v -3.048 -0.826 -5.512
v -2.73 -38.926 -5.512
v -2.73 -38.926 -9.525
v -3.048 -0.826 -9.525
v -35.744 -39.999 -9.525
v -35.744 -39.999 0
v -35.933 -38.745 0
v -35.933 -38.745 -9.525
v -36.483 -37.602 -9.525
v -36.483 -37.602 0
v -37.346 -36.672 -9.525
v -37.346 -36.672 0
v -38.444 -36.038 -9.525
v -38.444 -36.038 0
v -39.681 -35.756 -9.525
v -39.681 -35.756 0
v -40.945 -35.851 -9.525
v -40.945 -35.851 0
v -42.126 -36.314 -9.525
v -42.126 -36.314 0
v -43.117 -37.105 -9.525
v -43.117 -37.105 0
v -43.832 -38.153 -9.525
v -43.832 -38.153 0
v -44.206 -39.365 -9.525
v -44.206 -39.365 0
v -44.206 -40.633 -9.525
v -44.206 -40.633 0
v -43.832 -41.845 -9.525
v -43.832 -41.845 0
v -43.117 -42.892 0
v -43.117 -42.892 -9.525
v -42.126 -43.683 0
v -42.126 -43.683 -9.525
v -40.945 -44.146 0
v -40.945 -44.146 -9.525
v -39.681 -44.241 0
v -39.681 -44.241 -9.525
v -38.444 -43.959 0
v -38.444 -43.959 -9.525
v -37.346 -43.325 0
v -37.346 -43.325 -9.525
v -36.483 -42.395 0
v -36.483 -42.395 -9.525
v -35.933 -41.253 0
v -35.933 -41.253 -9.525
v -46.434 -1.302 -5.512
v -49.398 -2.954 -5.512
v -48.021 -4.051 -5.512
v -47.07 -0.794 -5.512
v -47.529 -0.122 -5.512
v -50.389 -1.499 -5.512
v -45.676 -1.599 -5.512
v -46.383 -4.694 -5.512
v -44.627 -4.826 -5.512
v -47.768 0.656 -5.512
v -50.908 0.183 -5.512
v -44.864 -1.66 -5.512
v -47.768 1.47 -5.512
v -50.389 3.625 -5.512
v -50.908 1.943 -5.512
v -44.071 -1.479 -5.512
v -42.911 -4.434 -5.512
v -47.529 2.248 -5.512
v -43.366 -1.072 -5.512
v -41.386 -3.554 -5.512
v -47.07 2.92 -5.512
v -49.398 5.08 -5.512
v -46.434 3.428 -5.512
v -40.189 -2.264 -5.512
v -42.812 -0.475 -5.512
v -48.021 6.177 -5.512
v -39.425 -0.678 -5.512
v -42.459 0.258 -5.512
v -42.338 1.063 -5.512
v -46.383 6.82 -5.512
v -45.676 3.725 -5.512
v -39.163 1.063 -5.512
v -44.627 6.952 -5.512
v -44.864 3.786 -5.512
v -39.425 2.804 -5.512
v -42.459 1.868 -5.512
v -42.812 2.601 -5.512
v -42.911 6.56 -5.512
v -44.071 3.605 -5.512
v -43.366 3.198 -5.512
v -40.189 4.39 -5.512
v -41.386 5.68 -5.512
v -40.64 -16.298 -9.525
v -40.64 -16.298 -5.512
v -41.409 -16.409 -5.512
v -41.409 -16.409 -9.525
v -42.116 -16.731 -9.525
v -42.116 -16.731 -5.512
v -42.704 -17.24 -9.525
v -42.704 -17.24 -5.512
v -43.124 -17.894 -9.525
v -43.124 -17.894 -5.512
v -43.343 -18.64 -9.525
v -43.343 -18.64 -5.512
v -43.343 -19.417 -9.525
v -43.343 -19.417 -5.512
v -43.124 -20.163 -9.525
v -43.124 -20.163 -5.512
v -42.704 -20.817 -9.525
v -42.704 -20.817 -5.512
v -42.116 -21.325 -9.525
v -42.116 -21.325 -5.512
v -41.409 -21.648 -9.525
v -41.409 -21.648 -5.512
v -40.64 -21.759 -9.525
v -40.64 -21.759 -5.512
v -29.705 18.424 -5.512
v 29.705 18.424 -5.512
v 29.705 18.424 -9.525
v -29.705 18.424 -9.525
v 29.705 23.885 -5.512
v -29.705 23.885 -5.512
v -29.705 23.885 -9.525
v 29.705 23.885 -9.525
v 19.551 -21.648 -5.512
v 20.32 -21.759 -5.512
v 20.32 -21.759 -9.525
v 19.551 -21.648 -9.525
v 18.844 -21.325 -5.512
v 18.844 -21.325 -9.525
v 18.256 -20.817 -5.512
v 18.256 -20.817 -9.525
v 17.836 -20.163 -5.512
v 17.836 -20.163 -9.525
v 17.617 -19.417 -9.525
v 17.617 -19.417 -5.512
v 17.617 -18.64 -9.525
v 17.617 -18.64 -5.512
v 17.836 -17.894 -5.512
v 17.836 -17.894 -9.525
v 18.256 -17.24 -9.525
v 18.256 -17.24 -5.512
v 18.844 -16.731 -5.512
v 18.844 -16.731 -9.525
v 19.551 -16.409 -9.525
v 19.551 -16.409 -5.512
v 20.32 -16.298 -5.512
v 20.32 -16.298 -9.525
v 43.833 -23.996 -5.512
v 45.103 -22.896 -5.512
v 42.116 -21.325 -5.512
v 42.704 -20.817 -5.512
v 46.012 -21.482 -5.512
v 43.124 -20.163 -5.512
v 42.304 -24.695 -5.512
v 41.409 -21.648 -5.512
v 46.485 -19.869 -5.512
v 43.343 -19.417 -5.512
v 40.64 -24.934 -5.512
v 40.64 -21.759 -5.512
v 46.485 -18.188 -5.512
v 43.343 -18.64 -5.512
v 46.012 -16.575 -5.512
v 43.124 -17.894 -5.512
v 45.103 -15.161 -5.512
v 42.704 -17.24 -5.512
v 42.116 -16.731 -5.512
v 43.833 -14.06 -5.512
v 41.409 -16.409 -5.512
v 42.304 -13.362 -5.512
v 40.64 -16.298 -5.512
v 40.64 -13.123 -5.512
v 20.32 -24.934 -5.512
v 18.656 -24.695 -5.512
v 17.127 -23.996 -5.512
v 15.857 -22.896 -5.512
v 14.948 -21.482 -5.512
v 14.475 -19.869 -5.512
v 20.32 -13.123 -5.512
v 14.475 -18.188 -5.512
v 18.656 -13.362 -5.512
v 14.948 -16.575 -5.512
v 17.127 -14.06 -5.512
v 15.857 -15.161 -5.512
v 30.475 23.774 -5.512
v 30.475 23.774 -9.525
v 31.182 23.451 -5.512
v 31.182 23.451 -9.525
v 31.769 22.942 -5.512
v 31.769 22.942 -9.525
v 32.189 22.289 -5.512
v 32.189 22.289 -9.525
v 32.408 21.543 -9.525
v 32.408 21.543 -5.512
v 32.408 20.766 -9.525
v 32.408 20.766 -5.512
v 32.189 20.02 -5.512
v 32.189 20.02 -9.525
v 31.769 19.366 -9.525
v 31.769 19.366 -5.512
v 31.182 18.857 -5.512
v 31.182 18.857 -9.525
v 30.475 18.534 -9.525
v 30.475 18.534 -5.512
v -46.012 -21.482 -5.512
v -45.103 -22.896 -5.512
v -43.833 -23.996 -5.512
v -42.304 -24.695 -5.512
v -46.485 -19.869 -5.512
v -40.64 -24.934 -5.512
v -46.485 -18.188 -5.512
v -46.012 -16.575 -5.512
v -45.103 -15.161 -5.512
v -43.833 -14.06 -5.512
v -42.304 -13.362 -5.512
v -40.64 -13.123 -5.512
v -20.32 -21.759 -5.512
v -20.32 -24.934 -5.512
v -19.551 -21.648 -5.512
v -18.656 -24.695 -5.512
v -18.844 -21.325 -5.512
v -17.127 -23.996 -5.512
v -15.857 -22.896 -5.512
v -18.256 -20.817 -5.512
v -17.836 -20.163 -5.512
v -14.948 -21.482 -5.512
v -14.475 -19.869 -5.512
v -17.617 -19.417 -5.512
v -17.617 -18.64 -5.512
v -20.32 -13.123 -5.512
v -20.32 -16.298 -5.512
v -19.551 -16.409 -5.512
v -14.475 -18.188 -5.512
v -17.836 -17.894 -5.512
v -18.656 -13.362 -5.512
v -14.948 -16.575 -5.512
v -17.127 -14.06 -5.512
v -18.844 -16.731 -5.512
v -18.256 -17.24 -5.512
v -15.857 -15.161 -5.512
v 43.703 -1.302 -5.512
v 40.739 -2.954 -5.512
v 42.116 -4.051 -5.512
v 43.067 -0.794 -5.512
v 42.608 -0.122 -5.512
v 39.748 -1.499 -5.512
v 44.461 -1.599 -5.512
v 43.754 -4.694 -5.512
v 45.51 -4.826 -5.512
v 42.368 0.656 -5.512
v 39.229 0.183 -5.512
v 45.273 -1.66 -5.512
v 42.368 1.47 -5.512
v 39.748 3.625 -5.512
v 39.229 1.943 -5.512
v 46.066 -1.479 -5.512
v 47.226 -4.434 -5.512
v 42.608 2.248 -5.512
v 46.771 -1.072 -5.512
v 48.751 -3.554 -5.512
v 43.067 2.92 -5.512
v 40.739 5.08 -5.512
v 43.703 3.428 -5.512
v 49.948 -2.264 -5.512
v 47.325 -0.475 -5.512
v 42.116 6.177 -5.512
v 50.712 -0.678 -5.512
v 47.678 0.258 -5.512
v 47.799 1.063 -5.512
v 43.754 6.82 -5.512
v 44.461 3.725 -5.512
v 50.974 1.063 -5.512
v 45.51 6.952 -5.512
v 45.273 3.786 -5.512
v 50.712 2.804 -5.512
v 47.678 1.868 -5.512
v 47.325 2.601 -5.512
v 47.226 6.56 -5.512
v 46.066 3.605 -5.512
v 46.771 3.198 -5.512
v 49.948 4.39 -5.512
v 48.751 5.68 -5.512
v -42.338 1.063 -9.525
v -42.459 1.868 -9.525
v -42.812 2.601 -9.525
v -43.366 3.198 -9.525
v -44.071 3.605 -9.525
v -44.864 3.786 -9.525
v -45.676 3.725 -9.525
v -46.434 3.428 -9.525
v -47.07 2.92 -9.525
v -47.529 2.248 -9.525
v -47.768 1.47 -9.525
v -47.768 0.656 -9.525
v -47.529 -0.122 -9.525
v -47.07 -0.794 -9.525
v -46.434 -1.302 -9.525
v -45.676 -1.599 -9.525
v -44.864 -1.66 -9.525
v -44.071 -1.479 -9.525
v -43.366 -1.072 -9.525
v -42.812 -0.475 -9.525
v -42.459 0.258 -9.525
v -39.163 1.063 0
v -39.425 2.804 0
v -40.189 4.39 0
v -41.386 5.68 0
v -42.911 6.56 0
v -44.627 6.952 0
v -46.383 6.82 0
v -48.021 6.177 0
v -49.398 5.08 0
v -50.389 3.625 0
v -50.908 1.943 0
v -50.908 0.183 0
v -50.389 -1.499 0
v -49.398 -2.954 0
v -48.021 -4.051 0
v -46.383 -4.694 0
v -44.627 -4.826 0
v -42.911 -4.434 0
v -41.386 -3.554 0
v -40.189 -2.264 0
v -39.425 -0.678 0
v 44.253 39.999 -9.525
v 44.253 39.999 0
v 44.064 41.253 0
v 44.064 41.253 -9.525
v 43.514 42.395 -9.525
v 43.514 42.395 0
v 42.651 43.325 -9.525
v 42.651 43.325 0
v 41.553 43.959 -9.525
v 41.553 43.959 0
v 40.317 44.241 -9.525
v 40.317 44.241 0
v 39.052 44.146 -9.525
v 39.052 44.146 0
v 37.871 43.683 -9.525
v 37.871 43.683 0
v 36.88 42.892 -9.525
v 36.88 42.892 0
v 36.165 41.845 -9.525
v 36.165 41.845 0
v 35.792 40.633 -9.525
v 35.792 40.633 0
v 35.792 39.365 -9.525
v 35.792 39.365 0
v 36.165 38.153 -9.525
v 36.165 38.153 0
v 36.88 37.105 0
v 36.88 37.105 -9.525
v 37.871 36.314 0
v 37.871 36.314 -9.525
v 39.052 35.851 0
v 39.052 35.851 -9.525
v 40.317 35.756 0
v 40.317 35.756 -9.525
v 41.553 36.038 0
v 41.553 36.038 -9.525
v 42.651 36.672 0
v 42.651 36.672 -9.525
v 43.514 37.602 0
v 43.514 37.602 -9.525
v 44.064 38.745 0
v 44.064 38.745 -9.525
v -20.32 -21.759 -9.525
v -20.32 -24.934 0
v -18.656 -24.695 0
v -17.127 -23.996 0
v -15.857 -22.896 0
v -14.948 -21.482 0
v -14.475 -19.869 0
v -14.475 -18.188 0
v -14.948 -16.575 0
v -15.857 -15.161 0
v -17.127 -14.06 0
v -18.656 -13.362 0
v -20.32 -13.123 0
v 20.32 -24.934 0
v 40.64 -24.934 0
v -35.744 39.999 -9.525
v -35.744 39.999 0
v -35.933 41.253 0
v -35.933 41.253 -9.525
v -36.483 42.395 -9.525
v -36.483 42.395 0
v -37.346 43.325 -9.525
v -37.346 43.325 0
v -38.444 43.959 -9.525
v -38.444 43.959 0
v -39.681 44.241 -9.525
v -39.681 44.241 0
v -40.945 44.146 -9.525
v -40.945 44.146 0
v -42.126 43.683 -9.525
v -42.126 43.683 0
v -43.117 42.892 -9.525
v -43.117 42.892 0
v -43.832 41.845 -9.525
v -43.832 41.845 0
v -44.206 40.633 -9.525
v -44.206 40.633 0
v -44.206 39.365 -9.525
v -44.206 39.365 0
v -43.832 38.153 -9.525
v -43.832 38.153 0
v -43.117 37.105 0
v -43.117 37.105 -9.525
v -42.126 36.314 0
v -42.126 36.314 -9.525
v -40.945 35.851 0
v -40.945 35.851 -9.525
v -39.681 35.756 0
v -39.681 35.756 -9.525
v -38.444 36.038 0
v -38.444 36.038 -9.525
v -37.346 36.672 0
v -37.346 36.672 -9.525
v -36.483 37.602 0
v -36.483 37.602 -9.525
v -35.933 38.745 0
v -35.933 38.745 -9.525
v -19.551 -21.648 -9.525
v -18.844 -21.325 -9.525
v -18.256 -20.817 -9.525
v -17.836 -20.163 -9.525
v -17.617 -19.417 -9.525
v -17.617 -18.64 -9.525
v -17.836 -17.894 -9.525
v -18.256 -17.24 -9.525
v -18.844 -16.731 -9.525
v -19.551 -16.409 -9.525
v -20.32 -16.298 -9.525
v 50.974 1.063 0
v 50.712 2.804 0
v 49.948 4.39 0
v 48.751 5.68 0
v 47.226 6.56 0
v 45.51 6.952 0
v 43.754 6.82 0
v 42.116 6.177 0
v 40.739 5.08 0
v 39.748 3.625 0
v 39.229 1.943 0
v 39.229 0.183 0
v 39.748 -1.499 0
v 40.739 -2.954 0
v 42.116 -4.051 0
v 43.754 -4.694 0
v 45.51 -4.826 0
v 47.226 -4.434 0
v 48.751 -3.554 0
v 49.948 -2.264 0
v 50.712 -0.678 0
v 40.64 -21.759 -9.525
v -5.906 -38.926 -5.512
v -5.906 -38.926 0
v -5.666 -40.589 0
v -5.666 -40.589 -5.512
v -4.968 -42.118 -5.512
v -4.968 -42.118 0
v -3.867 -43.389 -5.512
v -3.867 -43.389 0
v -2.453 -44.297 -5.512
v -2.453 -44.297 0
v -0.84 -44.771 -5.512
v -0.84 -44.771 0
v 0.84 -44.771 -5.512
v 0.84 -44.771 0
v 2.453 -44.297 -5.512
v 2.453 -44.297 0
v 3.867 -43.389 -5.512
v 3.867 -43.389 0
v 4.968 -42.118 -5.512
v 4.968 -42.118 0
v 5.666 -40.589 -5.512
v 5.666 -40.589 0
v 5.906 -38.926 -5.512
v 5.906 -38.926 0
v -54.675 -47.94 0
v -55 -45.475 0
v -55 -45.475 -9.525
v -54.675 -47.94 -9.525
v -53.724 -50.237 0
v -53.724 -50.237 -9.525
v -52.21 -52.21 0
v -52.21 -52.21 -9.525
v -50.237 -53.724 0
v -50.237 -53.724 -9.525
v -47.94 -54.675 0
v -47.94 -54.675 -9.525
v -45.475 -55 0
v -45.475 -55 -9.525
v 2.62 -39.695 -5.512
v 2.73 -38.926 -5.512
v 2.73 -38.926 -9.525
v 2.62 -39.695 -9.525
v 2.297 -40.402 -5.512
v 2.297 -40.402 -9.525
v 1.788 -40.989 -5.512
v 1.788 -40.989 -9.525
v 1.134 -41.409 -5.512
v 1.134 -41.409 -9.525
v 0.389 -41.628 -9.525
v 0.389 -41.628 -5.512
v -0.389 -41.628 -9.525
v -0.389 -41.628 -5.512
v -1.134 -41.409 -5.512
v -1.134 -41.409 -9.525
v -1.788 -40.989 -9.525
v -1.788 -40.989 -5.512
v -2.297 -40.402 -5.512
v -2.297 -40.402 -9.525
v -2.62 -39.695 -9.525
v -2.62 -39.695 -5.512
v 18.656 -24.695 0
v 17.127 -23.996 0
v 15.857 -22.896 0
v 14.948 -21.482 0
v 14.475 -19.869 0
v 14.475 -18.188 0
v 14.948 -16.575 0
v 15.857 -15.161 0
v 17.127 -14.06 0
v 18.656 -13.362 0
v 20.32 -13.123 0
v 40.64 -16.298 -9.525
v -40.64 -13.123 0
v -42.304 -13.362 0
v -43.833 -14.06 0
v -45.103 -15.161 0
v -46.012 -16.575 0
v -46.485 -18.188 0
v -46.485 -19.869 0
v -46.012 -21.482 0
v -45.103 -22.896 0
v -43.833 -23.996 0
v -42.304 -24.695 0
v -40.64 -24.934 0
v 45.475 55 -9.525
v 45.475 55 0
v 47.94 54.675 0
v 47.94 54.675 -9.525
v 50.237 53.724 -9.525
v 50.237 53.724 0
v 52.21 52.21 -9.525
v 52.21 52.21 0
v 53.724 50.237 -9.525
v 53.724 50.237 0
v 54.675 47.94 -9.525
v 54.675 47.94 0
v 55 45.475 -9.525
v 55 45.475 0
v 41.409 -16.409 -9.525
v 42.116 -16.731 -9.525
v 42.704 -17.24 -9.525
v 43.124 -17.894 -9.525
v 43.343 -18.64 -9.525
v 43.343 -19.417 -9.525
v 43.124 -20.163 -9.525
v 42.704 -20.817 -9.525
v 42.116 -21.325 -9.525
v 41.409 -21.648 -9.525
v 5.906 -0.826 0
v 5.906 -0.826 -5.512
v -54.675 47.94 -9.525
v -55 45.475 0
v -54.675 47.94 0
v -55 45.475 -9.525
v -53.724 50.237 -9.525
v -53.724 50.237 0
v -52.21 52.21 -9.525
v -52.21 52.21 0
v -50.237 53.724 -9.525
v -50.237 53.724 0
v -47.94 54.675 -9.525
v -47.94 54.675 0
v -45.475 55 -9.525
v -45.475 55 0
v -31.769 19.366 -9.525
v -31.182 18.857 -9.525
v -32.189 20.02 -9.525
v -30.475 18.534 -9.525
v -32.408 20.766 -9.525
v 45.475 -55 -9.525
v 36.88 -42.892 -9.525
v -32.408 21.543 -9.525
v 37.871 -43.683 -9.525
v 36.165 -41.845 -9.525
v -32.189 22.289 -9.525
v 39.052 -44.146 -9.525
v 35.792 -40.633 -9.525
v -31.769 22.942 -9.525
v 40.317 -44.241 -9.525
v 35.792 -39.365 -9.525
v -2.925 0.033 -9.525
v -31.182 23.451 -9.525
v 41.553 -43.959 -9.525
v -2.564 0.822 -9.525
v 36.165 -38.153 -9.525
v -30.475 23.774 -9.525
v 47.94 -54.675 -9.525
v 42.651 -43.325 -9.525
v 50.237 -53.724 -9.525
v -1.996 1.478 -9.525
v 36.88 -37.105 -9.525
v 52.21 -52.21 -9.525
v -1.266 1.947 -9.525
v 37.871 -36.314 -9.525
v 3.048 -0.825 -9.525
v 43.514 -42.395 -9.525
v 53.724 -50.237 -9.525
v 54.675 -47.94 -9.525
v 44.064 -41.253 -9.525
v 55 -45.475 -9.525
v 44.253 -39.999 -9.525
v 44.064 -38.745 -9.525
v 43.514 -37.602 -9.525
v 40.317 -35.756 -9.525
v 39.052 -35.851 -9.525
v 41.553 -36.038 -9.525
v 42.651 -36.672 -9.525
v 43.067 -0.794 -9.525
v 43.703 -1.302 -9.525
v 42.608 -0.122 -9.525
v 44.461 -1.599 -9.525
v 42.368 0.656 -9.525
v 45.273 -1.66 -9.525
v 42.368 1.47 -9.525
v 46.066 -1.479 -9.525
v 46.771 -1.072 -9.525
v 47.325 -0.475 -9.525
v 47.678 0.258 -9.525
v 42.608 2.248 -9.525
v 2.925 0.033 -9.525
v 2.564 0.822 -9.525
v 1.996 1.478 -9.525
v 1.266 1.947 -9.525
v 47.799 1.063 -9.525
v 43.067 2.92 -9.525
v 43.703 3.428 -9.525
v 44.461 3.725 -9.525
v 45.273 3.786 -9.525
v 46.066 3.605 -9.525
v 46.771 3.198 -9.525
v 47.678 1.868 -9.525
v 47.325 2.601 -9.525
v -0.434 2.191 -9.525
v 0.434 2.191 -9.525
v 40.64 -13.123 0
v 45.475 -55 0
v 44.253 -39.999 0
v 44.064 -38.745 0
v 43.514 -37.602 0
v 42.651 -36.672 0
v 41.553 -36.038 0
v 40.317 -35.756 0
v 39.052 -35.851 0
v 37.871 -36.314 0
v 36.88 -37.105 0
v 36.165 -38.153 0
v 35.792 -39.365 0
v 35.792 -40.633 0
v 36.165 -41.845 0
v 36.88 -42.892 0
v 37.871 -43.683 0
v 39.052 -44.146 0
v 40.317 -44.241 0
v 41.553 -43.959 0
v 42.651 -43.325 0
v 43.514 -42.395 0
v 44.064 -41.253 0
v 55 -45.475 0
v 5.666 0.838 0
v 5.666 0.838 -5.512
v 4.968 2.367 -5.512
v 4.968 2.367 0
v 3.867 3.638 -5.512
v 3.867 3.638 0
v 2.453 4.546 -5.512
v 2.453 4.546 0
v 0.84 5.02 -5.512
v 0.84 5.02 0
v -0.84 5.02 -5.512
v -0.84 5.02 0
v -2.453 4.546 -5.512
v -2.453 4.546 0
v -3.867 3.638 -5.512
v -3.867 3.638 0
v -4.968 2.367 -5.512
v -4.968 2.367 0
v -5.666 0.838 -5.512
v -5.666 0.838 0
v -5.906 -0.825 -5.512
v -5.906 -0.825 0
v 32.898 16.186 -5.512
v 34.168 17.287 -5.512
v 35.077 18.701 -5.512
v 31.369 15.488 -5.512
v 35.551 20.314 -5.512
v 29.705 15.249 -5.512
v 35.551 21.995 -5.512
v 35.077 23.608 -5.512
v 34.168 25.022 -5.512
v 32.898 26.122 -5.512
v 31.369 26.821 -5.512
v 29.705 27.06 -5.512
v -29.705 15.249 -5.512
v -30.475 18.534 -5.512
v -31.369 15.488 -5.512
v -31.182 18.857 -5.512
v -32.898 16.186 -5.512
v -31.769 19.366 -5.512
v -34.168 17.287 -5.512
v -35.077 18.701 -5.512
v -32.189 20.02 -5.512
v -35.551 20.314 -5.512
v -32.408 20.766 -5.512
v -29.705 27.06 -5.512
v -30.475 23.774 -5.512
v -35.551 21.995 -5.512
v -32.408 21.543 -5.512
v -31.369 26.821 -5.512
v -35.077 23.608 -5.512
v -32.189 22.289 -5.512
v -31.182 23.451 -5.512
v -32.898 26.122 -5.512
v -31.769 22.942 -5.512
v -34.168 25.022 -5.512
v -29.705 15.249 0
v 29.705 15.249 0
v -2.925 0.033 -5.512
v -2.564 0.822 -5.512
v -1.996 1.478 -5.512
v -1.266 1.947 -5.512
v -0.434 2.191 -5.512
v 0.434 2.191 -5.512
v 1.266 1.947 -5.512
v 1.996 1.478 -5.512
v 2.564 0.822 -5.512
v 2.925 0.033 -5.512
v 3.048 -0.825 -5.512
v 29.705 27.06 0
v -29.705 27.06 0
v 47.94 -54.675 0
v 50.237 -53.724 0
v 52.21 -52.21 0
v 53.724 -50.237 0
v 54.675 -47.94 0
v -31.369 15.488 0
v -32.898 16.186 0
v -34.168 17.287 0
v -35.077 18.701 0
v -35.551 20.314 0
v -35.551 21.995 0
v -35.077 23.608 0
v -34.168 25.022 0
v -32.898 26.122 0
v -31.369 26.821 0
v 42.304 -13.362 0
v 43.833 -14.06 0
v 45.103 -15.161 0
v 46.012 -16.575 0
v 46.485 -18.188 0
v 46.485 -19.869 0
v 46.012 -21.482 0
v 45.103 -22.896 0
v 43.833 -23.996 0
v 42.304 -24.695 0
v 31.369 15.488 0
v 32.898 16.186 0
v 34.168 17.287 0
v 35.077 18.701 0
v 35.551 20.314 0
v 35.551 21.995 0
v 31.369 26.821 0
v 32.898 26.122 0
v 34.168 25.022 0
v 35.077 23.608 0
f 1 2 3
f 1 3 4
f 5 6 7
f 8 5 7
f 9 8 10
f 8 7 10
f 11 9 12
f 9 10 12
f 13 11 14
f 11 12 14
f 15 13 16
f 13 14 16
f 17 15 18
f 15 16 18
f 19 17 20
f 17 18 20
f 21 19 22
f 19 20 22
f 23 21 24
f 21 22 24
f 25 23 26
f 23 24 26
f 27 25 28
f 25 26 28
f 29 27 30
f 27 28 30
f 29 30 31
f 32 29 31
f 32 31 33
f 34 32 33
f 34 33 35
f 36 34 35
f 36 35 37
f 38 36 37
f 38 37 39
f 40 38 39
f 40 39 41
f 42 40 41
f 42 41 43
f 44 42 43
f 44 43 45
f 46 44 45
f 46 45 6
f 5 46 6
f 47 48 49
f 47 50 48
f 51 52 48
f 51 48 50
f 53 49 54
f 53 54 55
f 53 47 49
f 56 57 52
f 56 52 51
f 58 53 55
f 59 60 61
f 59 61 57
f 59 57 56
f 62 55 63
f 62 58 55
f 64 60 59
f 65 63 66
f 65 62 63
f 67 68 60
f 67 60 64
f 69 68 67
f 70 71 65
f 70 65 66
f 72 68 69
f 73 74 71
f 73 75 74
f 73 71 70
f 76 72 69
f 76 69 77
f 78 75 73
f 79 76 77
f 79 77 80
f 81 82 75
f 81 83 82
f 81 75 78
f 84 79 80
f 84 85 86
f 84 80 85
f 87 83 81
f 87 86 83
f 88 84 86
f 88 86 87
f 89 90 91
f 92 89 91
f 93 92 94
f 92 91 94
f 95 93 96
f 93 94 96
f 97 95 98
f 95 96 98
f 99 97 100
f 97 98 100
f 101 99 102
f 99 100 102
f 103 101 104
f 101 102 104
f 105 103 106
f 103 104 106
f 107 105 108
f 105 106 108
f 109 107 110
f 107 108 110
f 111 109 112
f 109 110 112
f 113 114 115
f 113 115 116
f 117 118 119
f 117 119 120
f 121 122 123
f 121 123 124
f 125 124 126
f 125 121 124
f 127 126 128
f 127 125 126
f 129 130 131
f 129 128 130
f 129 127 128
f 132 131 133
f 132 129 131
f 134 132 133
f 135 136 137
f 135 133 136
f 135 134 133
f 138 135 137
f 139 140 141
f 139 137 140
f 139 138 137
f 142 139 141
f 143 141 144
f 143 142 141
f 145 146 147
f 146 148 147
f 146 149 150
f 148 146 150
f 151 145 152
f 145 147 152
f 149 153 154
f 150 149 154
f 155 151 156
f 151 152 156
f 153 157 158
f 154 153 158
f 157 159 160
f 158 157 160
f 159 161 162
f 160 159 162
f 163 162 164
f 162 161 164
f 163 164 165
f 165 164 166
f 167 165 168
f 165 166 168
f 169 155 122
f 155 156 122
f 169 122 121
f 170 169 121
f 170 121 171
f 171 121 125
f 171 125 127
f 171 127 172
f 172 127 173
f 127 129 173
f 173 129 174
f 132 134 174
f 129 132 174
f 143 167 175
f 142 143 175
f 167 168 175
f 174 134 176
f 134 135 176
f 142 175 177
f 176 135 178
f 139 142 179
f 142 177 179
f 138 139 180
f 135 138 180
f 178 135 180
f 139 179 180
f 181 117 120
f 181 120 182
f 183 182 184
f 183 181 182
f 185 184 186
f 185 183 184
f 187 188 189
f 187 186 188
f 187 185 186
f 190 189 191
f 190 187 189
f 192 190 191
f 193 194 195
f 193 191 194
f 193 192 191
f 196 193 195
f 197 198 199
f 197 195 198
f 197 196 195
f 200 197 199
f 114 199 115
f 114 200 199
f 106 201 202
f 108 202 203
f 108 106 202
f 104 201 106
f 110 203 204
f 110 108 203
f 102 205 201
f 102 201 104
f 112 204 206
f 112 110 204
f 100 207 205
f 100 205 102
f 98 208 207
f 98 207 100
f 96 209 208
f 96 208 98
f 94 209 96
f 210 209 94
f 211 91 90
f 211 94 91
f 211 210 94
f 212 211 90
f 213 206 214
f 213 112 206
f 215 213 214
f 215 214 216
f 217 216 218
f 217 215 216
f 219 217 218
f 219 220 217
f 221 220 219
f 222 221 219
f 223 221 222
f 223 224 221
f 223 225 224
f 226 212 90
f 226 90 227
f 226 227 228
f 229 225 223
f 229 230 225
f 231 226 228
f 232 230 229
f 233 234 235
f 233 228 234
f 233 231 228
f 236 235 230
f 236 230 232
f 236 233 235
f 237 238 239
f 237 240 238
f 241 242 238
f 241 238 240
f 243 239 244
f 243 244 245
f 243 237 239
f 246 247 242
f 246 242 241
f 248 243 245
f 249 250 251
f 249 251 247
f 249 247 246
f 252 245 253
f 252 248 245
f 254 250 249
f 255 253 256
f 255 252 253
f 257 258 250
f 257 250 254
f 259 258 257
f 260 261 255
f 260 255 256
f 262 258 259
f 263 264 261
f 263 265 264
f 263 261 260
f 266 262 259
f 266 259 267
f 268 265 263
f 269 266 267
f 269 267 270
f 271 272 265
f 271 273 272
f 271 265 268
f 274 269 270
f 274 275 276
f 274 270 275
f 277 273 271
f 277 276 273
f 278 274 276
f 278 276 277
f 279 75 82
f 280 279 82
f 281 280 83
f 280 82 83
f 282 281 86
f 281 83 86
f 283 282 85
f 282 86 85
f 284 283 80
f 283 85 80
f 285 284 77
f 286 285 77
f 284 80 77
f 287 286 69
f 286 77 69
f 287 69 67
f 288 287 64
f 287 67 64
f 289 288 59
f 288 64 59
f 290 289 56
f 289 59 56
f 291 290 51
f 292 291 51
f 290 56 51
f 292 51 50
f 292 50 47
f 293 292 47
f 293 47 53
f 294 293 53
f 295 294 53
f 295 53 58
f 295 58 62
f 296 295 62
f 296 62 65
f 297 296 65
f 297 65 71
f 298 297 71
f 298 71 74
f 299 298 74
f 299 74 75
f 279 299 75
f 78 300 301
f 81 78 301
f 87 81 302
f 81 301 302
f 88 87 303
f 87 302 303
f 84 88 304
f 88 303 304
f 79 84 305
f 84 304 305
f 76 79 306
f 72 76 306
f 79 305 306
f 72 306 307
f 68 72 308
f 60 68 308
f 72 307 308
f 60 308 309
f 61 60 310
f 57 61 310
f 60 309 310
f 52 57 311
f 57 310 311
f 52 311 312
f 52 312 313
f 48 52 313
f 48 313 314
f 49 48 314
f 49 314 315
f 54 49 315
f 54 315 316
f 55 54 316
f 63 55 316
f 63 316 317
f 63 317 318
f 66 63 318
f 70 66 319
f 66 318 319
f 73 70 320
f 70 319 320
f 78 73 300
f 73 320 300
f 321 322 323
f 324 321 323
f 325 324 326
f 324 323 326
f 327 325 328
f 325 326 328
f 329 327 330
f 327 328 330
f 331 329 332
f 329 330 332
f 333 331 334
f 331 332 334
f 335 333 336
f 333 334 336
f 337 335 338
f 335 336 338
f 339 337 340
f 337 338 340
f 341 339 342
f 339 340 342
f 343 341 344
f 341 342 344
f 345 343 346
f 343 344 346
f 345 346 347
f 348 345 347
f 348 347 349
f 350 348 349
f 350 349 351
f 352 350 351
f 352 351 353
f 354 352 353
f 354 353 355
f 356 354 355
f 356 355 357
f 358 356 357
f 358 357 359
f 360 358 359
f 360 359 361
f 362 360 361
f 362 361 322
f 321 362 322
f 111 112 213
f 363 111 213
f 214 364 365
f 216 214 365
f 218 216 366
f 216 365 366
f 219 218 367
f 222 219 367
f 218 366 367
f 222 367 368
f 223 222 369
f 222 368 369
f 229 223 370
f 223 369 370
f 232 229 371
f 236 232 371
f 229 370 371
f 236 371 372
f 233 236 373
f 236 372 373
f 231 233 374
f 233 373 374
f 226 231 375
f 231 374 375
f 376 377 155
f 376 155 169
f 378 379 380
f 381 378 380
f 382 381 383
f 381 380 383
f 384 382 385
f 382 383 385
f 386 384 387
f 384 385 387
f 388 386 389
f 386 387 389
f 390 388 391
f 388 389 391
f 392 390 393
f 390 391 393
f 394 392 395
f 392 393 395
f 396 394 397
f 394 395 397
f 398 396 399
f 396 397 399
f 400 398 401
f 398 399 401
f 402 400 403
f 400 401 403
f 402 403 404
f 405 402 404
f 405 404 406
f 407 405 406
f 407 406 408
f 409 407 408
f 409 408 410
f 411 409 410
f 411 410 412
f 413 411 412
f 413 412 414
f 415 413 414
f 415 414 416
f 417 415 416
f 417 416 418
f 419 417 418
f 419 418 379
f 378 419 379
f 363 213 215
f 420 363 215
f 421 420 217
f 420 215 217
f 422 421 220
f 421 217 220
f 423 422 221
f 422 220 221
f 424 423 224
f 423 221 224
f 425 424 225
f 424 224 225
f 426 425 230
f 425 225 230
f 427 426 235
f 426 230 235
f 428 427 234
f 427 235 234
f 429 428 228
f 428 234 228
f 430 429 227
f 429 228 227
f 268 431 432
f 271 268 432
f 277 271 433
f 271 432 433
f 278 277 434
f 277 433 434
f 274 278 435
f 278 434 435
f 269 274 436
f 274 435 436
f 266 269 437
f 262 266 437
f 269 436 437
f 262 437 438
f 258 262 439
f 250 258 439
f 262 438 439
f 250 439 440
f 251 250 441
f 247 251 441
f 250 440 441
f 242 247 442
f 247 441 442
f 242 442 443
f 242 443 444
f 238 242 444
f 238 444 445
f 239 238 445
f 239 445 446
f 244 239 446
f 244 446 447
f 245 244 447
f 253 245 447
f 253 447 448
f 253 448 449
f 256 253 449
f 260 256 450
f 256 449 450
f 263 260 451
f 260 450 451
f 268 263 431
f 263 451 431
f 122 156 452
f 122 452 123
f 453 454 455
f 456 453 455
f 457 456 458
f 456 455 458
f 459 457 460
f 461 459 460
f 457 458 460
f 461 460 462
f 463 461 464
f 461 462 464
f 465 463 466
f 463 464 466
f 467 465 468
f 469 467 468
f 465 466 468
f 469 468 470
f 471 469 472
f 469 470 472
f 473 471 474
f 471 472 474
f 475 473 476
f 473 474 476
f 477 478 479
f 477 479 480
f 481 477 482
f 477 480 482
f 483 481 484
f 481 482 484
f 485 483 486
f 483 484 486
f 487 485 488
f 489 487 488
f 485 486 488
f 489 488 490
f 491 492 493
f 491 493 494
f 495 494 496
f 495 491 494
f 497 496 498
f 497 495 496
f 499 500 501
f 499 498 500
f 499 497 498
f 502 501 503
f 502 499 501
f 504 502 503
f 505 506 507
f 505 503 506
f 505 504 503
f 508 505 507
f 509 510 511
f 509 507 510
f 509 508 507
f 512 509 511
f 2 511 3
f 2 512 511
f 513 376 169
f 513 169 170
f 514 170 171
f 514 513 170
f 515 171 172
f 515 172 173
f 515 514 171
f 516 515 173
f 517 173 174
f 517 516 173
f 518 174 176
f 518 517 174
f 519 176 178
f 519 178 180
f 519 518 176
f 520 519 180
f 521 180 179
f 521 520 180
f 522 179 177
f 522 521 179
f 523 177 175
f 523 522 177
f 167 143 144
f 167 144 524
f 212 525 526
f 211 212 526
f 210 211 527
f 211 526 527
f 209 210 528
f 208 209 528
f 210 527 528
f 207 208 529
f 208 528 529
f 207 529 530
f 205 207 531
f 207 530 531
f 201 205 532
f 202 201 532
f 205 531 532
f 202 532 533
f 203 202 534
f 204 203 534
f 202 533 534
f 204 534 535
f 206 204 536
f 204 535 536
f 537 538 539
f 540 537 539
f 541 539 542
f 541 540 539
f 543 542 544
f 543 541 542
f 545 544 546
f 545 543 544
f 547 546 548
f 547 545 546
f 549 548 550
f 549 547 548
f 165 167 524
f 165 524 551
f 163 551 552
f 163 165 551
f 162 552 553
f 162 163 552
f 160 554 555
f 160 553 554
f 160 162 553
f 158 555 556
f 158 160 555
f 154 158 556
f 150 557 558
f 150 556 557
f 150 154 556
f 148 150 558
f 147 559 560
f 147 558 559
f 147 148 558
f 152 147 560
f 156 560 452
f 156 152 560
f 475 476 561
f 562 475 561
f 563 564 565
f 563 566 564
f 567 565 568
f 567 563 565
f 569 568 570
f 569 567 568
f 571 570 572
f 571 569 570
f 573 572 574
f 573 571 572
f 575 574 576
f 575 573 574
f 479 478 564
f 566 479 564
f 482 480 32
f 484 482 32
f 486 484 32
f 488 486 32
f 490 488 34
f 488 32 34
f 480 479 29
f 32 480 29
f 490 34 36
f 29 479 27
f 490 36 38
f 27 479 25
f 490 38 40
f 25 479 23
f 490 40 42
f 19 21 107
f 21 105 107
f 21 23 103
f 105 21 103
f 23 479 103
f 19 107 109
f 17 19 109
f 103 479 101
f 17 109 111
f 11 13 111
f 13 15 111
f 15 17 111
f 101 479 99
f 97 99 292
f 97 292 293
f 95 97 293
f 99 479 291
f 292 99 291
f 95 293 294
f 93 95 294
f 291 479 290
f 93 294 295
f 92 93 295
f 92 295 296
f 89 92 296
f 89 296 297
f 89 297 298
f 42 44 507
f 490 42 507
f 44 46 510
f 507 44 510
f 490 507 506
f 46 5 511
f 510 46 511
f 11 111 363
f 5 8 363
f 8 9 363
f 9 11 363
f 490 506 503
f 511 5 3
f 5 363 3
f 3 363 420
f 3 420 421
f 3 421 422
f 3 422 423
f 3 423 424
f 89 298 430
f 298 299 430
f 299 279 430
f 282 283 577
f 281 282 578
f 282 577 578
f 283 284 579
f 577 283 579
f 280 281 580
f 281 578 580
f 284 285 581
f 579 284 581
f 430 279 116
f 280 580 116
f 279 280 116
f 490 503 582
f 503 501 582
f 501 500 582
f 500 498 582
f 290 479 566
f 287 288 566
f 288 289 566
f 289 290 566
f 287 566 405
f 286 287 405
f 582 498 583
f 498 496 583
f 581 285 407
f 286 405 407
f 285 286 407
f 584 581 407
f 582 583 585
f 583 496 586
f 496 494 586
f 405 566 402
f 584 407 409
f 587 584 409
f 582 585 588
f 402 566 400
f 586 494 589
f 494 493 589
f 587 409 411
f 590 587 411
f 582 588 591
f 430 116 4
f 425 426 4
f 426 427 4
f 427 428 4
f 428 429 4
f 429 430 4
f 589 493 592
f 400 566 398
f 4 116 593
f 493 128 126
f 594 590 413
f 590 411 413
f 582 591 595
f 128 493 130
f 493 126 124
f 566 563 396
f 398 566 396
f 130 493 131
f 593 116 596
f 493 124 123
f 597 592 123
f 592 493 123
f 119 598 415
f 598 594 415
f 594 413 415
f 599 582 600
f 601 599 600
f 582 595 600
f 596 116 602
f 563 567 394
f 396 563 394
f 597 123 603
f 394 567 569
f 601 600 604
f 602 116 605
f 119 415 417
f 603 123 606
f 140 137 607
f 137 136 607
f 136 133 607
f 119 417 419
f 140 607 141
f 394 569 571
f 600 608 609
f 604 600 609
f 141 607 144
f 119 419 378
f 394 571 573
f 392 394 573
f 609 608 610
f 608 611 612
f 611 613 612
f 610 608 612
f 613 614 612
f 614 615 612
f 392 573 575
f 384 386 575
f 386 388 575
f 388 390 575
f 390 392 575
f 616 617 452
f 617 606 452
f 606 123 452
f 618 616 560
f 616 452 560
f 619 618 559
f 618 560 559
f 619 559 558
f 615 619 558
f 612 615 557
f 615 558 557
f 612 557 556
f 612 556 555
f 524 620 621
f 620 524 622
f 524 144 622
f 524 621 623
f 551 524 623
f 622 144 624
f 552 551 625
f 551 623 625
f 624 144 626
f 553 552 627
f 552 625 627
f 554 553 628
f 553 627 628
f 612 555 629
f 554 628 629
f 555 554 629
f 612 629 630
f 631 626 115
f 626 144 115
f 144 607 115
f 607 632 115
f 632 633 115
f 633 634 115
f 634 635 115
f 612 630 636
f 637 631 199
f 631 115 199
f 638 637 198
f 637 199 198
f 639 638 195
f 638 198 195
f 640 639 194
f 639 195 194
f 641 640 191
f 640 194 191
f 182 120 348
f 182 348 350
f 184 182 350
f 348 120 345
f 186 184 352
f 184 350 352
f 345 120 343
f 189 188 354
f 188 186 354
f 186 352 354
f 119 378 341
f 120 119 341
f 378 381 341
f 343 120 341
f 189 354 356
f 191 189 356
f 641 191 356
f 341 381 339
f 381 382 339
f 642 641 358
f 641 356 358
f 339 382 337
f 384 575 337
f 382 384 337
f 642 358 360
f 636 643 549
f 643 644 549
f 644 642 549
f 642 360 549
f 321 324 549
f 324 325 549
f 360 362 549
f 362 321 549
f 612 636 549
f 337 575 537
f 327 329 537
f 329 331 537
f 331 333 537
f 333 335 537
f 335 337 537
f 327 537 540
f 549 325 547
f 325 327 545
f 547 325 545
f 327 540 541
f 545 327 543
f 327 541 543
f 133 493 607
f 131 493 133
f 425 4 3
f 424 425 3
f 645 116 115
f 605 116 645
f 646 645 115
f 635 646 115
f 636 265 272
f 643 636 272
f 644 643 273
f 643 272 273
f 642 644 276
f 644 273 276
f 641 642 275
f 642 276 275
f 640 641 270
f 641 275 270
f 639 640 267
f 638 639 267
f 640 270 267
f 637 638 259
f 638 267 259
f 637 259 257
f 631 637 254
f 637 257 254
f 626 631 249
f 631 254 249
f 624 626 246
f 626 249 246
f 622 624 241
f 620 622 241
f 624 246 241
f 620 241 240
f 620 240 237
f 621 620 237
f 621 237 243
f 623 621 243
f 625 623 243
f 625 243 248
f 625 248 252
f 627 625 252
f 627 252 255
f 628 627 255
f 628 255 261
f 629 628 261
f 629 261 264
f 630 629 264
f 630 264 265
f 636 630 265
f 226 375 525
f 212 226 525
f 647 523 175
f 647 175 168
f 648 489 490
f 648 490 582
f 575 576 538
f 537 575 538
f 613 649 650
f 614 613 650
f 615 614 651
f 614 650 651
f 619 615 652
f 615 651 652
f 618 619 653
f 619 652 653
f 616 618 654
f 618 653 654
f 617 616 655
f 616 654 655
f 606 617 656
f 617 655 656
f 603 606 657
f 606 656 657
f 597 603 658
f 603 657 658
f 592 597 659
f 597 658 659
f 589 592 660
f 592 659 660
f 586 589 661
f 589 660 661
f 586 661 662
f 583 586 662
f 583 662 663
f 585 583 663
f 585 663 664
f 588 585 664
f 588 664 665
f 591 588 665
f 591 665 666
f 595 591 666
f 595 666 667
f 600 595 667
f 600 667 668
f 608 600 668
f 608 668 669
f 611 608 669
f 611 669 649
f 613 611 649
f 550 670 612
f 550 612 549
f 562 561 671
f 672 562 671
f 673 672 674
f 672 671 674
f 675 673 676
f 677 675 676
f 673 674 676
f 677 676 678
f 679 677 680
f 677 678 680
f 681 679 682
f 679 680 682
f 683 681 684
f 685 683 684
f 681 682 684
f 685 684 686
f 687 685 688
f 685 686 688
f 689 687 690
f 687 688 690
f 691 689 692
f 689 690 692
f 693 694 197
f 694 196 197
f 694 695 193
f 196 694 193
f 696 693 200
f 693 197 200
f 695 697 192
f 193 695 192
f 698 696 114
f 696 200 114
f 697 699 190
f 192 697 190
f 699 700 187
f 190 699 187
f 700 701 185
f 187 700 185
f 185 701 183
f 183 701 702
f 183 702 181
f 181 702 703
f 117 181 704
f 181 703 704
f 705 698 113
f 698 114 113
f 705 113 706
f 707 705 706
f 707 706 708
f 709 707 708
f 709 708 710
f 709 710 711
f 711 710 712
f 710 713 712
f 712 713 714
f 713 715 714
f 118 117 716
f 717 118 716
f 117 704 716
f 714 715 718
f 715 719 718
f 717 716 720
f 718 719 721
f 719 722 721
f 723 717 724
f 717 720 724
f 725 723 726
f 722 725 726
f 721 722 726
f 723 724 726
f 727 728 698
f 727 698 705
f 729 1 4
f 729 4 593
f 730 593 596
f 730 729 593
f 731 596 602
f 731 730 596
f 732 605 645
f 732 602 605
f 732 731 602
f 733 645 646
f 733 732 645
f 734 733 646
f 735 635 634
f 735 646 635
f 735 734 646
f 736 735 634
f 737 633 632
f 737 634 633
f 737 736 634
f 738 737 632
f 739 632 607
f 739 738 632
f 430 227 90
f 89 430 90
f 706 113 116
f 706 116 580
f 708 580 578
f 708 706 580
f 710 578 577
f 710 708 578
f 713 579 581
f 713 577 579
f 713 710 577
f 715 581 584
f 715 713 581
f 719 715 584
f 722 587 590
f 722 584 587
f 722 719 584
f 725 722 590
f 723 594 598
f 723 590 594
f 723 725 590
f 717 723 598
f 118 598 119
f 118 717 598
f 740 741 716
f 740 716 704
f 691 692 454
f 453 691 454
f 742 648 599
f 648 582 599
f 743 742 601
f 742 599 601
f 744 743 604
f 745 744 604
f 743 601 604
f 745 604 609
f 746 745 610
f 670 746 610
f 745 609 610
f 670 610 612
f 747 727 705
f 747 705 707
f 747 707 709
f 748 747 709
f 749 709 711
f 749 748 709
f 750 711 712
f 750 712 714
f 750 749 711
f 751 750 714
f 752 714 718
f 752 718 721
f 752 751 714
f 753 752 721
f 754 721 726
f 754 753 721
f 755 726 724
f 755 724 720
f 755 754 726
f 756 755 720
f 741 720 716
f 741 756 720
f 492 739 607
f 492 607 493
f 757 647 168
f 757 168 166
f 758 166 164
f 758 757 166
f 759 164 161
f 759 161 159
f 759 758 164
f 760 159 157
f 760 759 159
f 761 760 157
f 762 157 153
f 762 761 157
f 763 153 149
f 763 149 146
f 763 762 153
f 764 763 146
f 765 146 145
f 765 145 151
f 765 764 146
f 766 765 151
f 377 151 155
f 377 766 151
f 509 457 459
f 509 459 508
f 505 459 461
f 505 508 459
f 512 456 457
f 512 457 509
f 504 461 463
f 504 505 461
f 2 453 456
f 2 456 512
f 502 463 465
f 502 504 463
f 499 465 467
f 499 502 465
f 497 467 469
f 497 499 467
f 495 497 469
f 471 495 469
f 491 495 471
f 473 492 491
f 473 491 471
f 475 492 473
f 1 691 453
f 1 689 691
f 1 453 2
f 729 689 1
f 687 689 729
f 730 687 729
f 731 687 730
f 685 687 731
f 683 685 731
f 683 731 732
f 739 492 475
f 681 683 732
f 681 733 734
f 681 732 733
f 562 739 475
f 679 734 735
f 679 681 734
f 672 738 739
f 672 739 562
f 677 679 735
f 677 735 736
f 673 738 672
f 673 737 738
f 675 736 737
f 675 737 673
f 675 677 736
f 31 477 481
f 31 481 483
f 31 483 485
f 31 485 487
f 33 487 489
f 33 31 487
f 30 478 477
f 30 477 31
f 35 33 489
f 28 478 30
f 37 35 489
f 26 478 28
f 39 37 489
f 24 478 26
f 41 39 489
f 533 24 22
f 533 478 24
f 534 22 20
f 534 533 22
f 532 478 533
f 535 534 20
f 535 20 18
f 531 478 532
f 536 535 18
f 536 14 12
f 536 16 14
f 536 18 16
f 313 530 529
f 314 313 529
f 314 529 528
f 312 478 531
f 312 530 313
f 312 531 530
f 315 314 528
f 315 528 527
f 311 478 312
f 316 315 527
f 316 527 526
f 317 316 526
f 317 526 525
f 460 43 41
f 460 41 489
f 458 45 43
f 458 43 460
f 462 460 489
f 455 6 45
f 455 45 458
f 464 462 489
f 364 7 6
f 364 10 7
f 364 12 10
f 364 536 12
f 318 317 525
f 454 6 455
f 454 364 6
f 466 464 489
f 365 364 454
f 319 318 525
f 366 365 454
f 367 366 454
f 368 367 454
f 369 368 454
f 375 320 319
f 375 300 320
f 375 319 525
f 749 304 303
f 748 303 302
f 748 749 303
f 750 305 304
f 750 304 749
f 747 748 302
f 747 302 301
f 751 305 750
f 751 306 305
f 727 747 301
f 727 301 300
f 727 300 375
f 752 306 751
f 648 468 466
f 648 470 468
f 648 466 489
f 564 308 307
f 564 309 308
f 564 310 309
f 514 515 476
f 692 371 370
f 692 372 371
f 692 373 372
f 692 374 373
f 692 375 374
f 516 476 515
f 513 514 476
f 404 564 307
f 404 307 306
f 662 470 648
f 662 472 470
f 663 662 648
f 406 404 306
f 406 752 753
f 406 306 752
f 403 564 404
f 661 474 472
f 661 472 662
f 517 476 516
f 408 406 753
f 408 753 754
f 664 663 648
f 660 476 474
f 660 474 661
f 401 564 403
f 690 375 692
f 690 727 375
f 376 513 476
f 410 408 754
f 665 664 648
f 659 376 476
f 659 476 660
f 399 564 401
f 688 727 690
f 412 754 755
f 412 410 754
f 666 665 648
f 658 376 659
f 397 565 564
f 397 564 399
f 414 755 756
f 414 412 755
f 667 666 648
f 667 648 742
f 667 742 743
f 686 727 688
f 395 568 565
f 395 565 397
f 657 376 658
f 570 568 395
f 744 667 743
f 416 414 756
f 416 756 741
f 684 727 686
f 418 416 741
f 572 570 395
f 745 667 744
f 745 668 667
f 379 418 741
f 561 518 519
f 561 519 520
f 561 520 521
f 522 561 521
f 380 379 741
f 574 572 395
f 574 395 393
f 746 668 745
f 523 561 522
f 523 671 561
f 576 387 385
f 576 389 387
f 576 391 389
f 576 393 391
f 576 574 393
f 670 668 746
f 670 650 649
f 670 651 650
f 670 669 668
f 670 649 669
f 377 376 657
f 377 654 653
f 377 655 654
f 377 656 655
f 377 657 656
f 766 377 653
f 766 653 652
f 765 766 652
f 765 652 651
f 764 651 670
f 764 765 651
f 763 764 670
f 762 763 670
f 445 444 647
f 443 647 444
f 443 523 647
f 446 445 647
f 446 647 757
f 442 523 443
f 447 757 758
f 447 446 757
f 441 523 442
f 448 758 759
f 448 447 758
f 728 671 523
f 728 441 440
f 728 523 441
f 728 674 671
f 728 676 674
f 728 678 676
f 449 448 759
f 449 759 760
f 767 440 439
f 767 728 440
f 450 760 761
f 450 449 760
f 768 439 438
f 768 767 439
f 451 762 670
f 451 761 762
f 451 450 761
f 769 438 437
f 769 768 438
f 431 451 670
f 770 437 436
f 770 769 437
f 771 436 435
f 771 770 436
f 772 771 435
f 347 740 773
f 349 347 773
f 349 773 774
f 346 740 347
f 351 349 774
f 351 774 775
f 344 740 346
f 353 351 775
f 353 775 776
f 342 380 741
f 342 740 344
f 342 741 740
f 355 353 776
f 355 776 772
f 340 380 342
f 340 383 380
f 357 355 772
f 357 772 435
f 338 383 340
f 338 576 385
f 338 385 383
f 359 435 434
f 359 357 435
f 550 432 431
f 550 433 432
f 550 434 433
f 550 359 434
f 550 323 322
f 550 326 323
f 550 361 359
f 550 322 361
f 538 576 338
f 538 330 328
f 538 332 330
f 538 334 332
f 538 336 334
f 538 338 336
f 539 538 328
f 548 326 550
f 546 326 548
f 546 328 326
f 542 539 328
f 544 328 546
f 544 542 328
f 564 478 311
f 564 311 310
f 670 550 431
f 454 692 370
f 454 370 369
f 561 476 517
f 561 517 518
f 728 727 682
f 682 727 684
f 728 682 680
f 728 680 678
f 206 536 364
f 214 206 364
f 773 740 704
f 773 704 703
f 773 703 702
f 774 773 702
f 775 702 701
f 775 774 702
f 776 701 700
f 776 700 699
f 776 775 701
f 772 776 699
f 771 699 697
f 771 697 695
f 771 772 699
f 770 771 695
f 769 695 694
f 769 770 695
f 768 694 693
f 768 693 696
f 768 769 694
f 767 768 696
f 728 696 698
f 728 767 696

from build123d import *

# Parameters (mm, degrees)
SKETCH1_W           = 109.99978
SKETCH1_H           = 109.99978
BOSS_EXTRUDE1_DEPTH = 9.525
SKETCH2_R           = 5.9055
CUT_EXTRUDE1_DEPTH  = 5.5118
SKETCH3_R           = 2.7305
CUT_EXTRUDE3_DEPTH  = 10.525
SKETCH4_R           = 4.2545
CUT_EXTRUDE4_DEPTH  = 10.525
FILLET1_R           = 9.525


with BuildPart() as part:
    # Sketch1 → Boss-Extrude1 (new body)
    with BuildSketch(Plane.XY):
        Rectangle(SKETCH1_W, SKETCH1_H)
    extrude(amount=-BOSS_EXTRUDE1_DEPTH)

    # Sketch2 → Cut-Extrude1 (cut)
    with BuildSketch(Plane.XY):
        with Locations((45.06849, 1.06299)):
            Circle(SKETCH2_R)
        with Locations((-45.06849, 1.06299)):
            Circle(SKETCH2_R)
        with BuildLine():
            Line((-29.7053, 27.05989), (29.7053, 27.05989))
            ThreePointArc((29.7053, 27.05989), (35.6108, 21.15439), (29.7053, 15.24889))
            Line((29.7053, 15.24889), (-29.7053, 15.24889))
            ThreePointArc((-29.7053, 15.24889), (-35.6108, 21.15439), (-29.7053, 27.05989))
        make_face()
        with BuildLine():
            Line((-5.9055, -0.8255), (-5.9055, -38.9255))
            ThreePointArc((-5.9055, -38.9255), (0, -44.831), (5.9055, -38.9255))
            Line((5.9055, -38.9255), (5.9055, -0.8255))
            ThreePointArc((5.9055, -0.8255), (0, 5.08), (-5.9055, -0.8255))
        make_face()
        with BuildLine():
            Line((20.32, -13.12291), (40.64, -13.12291))
            ThreePointArc((40.64, -13.12291), (46.5455, -19.02841), (40.64, -24.93391))
            Line((40.64, -24.93391), (20.32, -24.93391))
            ThreePointArc((20.32, -24.93391), (14.4145, -19.02841), (20.32, -13.12291))
        make_face()
        with BuildLine():
            Line((-20.32, -13.12291), (-40.64, -13.12291))
            ThreePointArc((-40.64, -13.12291), (-46.5455, -19.02841), (-40.64, -24.93391))
            Line((-40.64, -24.93391), (-20.32, -24.93391))
            ThreePointArc((-20.32, -24.93391), (-14.4145, -19.02841), (-20.32, -13.12291))
        make_face()
    extrude(amount=-CUT_EXTRUDE1_DEPTH, mode=Mode.SUBTRACT)

    # Sketch3 → Cut-Extrude3 (cut, through all)
    with BuildSketch(Plane.XY):
        with BuildLine():
            ThreePointArc((29.7053, 23.88489), (32.4358, 21.15439), (29.7053, 18.42389))
            Line((29.7053, 18.42389), (-29.7053, 18.42389))
            ThreePointArc((-29.7053, 18.42389), (-32.4358, 21.15439), (-29.7053, 23.88489))
            Line((-29.7053, 23.88489), (29.7053, 23.88489))
        make_face()
        with BuildLine():
            Line((3.048, -0.8255), (2.7305, -38.9255))
            ThreePointArc((2.7305, -38.9255), (0, -41.656), (-2.7305, -38.9255))
            Line((-2.7305, -38.9255), (-3.048, -0.8255))
            ThreePointArc((-3.048, -0.8255), (0, 2.2225), (3.048, -0.8255))
        make_face()
        with BuildLine():
            Line((-20.32, -16.29791), (-40.64, -16.29791))
            ThreePointArc((-40.64, -16.29791), (-43.3705, -19.02841), (-40.64, -21.75891))
            Line((-40.64, -21.75891), (-20.32, -21.75891))
            ThreePointArc((-20.32, -21.75891), (-17.5895, -19.02841), (-20.32, -16.29791))
        make_face()
        with BuildLine():
            ThreePointArc((40.64, -16.29791), (43.3705, -19.02841), (40.64, -21.75891))
            Line((40.64, -21.75891), (20.32, -21.75891))
            ThreePointArc((20.32, -21.75891), (17.5895, -19.02841), (20.32, -16.29791))
            Line((20.32, -16.29791), (40.64, -16.29791))
        make_face()
        with Locations((-45.06849, 1.06299)):
            Circle(SKETCH3_R)
        with Locations((45.06849, 1.06299)):
            Circle(SKETCH3_R)
    extrude(amount=-CUT_EXTRUDE3_DEPTH, mode=Mode.SUBTRACT)

    # Sketch4 → Cut-Extrude4 (cut, through all)
    with BuildSketch(Plane.XY):
        with Locations((-39.99865, -39.99865)):
            Circle(SKETCH4_R)
        with Locations((-39.99865, 39.99865)):
            Circle(SKETCH4_R)
        with Locations((39.99865, -39.99865)):
            Circle(SKETCH4_R)
        with Locations((39.99865, 39.99865)):
            Circle(SKETCH4_R)
    extrude(amount=-CUT_EXTRUDE4_DEPTH, mode=Mode.SUBTRACT)

    # Fillet1
    fillet1_edges = [part.edges().sort_by_distance(p)[0] for p in [
        (-54.99989, 54.99989, -4.7625),
        (-54.99989, -54.99989, -4.7625),
        (54.99989, -54.99989, -4.7625),
        (54.99989, 54.99989, -4.7625),
    ]]
    fillet(fillet1_edges, radius=FILLET1_R)


solid = part.part
